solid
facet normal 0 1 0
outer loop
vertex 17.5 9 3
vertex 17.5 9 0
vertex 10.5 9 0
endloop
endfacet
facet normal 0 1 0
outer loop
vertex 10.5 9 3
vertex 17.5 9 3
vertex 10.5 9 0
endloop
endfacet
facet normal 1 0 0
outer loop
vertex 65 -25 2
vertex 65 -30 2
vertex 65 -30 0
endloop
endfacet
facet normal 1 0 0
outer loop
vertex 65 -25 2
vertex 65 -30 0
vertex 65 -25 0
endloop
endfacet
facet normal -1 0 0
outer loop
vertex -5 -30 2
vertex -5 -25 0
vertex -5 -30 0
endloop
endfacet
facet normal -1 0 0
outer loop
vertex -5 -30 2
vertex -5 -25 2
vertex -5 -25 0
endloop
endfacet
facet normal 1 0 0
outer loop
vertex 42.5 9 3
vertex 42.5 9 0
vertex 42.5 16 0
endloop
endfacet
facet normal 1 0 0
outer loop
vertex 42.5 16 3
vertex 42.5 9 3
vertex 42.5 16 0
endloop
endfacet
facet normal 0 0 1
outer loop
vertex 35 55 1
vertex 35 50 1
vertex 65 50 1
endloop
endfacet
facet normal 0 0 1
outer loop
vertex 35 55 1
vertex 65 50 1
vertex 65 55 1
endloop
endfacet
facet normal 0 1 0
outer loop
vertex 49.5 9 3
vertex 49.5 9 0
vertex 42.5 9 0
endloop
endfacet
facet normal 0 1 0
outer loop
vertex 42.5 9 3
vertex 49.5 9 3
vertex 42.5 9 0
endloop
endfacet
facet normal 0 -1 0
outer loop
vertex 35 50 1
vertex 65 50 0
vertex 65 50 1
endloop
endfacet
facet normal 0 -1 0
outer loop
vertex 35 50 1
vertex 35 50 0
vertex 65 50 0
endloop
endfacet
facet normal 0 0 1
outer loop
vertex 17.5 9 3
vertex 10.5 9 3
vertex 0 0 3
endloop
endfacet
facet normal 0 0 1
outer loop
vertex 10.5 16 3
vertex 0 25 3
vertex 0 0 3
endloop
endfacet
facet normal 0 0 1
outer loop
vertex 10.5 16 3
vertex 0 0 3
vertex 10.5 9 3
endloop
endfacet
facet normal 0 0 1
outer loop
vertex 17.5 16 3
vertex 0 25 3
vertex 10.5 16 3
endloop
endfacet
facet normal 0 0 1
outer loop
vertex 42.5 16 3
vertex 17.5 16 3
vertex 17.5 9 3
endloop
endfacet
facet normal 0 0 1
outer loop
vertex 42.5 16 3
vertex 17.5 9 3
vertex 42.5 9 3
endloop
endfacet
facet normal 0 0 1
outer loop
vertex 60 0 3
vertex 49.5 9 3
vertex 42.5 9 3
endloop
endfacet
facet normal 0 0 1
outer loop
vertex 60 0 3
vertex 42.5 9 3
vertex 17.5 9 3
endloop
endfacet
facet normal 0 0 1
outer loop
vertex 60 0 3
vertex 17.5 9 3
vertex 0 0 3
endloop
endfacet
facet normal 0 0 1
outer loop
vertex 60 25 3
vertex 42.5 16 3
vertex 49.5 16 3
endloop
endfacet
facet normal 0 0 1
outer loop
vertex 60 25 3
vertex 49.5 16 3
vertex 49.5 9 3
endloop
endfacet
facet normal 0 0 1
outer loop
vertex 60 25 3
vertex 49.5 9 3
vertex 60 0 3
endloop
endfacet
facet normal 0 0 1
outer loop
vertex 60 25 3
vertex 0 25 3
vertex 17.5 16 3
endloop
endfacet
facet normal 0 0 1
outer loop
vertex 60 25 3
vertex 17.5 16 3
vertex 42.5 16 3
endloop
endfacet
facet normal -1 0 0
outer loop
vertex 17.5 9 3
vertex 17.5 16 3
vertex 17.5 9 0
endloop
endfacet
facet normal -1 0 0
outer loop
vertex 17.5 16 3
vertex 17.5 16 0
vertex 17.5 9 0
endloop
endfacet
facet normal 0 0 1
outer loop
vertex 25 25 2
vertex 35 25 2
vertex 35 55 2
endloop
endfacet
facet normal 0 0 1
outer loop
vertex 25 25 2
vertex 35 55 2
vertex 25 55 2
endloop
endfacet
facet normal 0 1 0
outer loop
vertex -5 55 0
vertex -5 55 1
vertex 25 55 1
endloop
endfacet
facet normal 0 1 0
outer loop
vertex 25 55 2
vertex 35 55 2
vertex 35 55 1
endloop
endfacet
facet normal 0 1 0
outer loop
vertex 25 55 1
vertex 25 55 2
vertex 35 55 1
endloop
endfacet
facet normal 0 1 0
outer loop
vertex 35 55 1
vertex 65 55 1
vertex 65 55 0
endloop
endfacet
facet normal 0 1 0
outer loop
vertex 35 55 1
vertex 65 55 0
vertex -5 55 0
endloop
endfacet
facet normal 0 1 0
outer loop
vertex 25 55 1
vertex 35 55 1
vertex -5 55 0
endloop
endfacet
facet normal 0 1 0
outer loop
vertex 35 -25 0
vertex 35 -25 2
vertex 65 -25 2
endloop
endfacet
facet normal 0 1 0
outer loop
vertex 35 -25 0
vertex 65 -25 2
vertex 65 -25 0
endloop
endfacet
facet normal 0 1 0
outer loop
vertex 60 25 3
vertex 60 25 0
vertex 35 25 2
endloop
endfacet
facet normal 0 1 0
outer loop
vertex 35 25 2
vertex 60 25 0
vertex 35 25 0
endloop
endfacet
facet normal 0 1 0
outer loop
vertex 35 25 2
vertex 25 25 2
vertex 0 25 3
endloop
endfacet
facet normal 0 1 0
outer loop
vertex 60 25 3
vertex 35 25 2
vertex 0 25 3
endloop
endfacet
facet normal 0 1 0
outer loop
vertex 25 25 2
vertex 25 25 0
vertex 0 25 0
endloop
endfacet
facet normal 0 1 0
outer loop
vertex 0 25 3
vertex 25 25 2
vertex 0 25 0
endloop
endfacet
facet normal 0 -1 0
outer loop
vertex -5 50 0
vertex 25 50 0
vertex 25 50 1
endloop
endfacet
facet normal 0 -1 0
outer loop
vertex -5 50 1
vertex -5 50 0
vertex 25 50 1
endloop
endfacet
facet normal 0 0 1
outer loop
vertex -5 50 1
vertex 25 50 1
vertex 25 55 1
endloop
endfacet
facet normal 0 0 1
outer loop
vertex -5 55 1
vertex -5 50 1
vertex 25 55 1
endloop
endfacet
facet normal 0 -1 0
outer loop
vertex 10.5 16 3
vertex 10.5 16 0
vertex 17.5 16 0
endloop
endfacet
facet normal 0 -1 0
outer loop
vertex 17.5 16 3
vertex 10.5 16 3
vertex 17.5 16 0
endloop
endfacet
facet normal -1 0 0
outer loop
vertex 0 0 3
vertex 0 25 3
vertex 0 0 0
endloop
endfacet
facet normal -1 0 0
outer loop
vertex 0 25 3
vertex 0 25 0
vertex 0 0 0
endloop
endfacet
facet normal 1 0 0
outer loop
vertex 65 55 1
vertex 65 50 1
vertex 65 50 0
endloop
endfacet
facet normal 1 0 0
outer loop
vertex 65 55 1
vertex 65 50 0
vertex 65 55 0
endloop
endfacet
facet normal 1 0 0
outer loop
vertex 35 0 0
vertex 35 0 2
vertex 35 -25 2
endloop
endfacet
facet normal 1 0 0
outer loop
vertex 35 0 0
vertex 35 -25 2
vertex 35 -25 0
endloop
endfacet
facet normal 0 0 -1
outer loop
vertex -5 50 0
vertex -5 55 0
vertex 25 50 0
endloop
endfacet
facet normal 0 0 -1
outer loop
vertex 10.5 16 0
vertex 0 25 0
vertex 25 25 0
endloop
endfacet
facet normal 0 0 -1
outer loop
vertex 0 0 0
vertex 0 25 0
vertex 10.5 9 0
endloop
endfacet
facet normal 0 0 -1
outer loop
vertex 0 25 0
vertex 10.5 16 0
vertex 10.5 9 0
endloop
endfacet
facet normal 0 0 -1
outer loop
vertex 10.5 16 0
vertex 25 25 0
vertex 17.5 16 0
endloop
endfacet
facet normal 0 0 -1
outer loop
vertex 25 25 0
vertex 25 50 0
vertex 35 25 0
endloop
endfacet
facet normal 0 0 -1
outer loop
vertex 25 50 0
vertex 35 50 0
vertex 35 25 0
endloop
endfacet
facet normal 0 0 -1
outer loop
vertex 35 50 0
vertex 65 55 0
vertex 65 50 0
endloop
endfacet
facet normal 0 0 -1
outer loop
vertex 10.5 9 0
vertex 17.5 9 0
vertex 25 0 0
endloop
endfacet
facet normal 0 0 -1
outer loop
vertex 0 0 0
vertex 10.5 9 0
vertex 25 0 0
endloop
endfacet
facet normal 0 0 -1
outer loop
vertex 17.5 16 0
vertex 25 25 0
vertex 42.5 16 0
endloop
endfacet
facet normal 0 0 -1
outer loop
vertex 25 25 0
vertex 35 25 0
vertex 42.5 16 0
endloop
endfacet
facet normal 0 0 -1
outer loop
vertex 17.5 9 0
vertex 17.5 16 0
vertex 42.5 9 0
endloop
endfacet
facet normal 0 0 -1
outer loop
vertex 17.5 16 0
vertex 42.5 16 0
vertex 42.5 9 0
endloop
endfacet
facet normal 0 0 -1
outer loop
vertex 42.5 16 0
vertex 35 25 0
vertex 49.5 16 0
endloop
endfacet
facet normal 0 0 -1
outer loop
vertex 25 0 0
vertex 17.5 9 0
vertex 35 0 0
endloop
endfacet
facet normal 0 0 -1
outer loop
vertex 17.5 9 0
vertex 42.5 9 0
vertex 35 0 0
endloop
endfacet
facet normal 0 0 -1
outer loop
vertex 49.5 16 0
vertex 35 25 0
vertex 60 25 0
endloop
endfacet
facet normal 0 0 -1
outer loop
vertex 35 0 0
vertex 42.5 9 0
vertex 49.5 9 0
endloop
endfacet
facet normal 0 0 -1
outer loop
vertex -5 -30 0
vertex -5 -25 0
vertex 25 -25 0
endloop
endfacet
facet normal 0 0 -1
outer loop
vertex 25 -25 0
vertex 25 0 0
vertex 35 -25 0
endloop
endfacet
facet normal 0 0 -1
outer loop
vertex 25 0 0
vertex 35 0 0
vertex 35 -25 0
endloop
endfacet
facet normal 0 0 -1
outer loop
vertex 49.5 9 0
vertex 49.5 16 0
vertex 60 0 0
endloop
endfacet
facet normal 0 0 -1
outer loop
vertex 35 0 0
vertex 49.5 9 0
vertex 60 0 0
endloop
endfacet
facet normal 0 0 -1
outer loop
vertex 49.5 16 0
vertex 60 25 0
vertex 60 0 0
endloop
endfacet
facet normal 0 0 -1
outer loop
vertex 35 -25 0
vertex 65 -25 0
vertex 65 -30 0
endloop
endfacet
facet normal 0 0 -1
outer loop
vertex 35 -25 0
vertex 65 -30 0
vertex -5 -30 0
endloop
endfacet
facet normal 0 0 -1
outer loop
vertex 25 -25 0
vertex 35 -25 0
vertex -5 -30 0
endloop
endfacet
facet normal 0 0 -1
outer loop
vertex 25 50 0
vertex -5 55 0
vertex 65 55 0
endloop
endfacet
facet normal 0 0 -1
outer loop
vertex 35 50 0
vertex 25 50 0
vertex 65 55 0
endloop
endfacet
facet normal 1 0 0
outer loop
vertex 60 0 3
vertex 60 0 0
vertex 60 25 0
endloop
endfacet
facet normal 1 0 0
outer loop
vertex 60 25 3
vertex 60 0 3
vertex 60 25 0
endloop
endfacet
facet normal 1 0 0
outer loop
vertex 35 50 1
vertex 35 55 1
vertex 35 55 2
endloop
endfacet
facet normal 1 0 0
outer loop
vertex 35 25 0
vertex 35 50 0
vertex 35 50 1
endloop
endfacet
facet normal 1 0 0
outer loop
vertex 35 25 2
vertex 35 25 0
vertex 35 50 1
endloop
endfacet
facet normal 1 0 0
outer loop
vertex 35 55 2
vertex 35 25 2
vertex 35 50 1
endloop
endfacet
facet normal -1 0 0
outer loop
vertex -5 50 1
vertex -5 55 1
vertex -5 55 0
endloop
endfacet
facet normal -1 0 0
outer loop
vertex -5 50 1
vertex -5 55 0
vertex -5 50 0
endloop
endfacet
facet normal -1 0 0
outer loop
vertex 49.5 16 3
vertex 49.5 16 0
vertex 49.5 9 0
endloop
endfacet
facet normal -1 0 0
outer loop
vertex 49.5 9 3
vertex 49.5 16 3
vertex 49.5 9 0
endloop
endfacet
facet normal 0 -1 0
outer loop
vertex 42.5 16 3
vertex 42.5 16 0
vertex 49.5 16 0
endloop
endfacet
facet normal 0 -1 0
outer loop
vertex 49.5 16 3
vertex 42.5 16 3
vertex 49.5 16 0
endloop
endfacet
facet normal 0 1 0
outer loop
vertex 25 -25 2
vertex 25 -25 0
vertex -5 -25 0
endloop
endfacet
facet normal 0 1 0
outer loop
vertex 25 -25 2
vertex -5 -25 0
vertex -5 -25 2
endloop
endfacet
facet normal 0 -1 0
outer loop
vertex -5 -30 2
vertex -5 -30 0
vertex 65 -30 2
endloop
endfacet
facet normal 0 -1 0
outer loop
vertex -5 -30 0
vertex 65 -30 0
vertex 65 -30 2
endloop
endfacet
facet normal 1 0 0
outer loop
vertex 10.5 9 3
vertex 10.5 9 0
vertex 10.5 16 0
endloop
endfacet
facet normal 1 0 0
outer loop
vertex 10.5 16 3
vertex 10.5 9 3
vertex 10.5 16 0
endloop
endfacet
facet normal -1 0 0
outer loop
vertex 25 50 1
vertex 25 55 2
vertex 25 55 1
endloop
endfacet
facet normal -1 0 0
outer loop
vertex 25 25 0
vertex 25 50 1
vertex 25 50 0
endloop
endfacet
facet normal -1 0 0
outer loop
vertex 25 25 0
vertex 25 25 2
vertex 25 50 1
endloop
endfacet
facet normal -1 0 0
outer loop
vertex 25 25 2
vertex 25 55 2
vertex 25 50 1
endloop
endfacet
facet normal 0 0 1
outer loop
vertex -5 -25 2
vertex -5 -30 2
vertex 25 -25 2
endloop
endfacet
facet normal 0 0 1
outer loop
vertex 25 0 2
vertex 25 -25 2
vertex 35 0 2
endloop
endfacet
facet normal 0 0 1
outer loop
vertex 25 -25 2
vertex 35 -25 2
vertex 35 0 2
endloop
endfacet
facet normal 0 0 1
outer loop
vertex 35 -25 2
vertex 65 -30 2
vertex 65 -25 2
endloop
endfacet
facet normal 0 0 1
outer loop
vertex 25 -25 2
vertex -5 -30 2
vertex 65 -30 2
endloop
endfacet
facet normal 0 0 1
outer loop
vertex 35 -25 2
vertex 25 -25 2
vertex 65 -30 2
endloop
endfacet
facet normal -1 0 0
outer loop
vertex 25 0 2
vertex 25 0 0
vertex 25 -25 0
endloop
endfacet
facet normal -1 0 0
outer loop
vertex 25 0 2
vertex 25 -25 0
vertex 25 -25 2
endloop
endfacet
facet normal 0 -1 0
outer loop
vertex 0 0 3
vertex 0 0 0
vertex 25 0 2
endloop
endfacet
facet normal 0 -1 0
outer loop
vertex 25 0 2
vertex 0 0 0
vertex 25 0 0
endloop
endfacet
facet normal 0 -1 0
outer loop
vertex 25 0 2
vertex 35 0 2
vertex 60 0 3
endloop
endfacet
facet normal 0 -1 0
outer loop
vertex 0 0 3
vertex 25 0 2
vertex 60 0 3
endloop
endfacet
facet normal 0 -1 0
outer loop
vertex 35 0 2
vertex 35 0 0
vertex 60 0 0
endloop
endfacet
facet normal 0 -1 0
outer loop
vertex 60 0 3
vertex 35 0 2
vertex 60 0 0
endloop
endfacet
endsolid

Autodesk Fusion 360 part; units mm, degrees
sketch "Sketch1" plane through (0, 0, 0) normal (0, 0, 1) x (1, 0, 0)
  line L0 (0, 0) -> (60, 0)
  line L1 (60, 0) -> (60, 25)
  line L2 (60, 25) -> (0, 25)
  line L3 (0, 25) -> (0, 0)
  line L4 (5, 20) -> (55, 20)
  line L5 (55, 20) -> (55, 5)
  line L6 (55, 5) -> (5, 5)
  line L7 (5, 5) -> (5, 20)
  line L8 (10.5, 16) -> (17.5, 16)
  line L9 (17.5, 16) -> (17.5, 9)
  line L10 (17.5, 9) -> (10.5, 9)
  line L11 (10.5, 9) -> (10.5, 16)
  line L12 (42.5, 16) -> (49.5, 16)
  line L13 (49.5, 16) -> (49.5, 9)
  line L14 (49.5, 9) -> (42.5, 9)
  line L15 (42.5, 9) -> (42.5, 16)
  dimension "d1" = 60
  dimension "d2" = 25
  dimension "d3" = 50
  dimension "d4" = 15
  dimension "d5" = 5
  dimension "d7" = 5
  dimension "d8" = 7
  dimension "d9" = 7
  dimension "d10" = 4
  dimension "d12" = 7
  dimension "d13" = 7
  dimension "d15" = 4
  dimension "d16" = 5.5
  dimension "d17" = 5.5
  dimension "d18" = 25
sketch "Sketch2" plane through (0, 0, 0) normal (0, 0, 1) x (1, 0, 0)
extrude "Extrude1" add sketch "Sketch1" along normal blind 3 contours L0 L1 L2 L3 | L4 L5 L6 L7
sketch "Sketch3" plane through (0, 0, 0) normal (0, -1, 0) x (1, 0, 0)
  line L0 (0, 0) -> (60, 0)
  line L1 (60, 0) -> (60, 3)
  line L2 (60, 3) -> (0, 3)
  line L3 (0, 3) -> (0, 0)
  line L4 (25, 2) -> (35, 2)
  line L5 (35, 2) -> (35, 0)
  line L6 (35, 0) -> (25, 0)
  line L7 (25, 0) -> (25, 2)
  dimension "d21" = 10
extrude "Extrude2" add sketch "Sketch3" along normal blind 30 contours L0 L4 L5 L6 L7
sketch "Sketch4" plane through (0, 25, 0) normal (0, 1, 0) x (-1, 0, 0)
  line L0 (-60, 0) -> (0, 0)
  line L1 (0, 0) -> (0, 3)
  line L2 (0, 3) -> (-60, 3)
  line L3 (-60, 3) -> (-60, 0)
  line L4 (-35, 2) -> (-25, 2)
  line L5 (-25, 2) -> (-25, 0)
  line L6 (-25, 0) -> (-35, 0)
  line L7 (-35, 0) -> (-35, 2)
extrude "Extrude3" add sketch "Sketch4" along normal blind 30 contours L0 L4 L5 L6 L7
sketch "Sketch5" plane through (35, 0, 0) normal (1, 0, 0) x (0, 1, 0)
  line L0 (25, 2) -> (25, 0)
  line L1 (25, 0) -> (55, 0)
  line L2 (55, 0) -> (55, 2)
  line L3 (55, 2) -> (25, 2)
  line L4 (50, 1) -> (55, 1)
  line L5 (55, 1) -> (55, 0)
  line L6 (55, 0) -> (50, 0)
  line L7 (50, 0) -> (50, 1)
extrude "Extrude4" add sketch "Sketch5" along normal blind 30 contours L1 L2 L4 L5 L6 L7
sketch "Sketch6" plane through (25, 0, 0) normal (-1, 0, 0) x (0, -1, 0)
  line L0 (-25, 0) -> (-25, 2)
  line L1 (-25, 2) -> (-55, 2)
  line L2 (-55, 2) -> (-55, 0)
  line L3 (-55, 0) -> (-25, 0)
  line L4 (-50, 1) -> (-55, 1)
  line L5 (-55, 1) -> (-55, 0)
  line L6 (-55, 0) -> (-50, 0)
  line L7 (-50, 0) -> (-50, 1)
extrude "Extrude5" add sketch "Sketch6" along normal blind 30 contours L2 L3 L4 L5 L6 L7
sketch "Sketch7" plane through (35, 0, 0) normal (1, 0, 0) x (0, 1, 0)
  line L0 (0, 0) -> (0, 2)
  line L1 (0, 2) -> (-30, 2)
  line L2 (-30, 2) -> (-30, 0)
  line L3 (-30, 0) -> (0, 0)
  line L4 (-30, 2) -> (-25, 2)
  line L5 (-25, 2) -> (-25, 0)
  line L6 (-25, 0) -> (-30, 0)
  line L7 (-30, 0) -> (-30, 2)
extrude "Extrude6" add sketch "Sketch7" along normal blind 30 contours L1 L2 L3 L4 L5 L6 L7
sketch "Sketch8" plane through (25, 0, 0) normal (-1, 0, 0) x (0, -1, 0)
  line L0 (0, 2) -> (0, 0)
  line L1 (0, 0) -> (30, 0)
  line L2 (30, 0) -> (30, 2)
  line L3 (30, 2) -> (0, 2)
  line L4 (25, 2) -> (30, 2)
  line L5 (30, 2) -> (30, 0)
  line L6 (30, 0) -> (25, 0)
  line L7 (25, 0) -> (25, 2)
extrude "Extrude7" add sketch "Sketch8" along normal blind 30 contours L1 L2 L3 L4 L5 L6 L7
